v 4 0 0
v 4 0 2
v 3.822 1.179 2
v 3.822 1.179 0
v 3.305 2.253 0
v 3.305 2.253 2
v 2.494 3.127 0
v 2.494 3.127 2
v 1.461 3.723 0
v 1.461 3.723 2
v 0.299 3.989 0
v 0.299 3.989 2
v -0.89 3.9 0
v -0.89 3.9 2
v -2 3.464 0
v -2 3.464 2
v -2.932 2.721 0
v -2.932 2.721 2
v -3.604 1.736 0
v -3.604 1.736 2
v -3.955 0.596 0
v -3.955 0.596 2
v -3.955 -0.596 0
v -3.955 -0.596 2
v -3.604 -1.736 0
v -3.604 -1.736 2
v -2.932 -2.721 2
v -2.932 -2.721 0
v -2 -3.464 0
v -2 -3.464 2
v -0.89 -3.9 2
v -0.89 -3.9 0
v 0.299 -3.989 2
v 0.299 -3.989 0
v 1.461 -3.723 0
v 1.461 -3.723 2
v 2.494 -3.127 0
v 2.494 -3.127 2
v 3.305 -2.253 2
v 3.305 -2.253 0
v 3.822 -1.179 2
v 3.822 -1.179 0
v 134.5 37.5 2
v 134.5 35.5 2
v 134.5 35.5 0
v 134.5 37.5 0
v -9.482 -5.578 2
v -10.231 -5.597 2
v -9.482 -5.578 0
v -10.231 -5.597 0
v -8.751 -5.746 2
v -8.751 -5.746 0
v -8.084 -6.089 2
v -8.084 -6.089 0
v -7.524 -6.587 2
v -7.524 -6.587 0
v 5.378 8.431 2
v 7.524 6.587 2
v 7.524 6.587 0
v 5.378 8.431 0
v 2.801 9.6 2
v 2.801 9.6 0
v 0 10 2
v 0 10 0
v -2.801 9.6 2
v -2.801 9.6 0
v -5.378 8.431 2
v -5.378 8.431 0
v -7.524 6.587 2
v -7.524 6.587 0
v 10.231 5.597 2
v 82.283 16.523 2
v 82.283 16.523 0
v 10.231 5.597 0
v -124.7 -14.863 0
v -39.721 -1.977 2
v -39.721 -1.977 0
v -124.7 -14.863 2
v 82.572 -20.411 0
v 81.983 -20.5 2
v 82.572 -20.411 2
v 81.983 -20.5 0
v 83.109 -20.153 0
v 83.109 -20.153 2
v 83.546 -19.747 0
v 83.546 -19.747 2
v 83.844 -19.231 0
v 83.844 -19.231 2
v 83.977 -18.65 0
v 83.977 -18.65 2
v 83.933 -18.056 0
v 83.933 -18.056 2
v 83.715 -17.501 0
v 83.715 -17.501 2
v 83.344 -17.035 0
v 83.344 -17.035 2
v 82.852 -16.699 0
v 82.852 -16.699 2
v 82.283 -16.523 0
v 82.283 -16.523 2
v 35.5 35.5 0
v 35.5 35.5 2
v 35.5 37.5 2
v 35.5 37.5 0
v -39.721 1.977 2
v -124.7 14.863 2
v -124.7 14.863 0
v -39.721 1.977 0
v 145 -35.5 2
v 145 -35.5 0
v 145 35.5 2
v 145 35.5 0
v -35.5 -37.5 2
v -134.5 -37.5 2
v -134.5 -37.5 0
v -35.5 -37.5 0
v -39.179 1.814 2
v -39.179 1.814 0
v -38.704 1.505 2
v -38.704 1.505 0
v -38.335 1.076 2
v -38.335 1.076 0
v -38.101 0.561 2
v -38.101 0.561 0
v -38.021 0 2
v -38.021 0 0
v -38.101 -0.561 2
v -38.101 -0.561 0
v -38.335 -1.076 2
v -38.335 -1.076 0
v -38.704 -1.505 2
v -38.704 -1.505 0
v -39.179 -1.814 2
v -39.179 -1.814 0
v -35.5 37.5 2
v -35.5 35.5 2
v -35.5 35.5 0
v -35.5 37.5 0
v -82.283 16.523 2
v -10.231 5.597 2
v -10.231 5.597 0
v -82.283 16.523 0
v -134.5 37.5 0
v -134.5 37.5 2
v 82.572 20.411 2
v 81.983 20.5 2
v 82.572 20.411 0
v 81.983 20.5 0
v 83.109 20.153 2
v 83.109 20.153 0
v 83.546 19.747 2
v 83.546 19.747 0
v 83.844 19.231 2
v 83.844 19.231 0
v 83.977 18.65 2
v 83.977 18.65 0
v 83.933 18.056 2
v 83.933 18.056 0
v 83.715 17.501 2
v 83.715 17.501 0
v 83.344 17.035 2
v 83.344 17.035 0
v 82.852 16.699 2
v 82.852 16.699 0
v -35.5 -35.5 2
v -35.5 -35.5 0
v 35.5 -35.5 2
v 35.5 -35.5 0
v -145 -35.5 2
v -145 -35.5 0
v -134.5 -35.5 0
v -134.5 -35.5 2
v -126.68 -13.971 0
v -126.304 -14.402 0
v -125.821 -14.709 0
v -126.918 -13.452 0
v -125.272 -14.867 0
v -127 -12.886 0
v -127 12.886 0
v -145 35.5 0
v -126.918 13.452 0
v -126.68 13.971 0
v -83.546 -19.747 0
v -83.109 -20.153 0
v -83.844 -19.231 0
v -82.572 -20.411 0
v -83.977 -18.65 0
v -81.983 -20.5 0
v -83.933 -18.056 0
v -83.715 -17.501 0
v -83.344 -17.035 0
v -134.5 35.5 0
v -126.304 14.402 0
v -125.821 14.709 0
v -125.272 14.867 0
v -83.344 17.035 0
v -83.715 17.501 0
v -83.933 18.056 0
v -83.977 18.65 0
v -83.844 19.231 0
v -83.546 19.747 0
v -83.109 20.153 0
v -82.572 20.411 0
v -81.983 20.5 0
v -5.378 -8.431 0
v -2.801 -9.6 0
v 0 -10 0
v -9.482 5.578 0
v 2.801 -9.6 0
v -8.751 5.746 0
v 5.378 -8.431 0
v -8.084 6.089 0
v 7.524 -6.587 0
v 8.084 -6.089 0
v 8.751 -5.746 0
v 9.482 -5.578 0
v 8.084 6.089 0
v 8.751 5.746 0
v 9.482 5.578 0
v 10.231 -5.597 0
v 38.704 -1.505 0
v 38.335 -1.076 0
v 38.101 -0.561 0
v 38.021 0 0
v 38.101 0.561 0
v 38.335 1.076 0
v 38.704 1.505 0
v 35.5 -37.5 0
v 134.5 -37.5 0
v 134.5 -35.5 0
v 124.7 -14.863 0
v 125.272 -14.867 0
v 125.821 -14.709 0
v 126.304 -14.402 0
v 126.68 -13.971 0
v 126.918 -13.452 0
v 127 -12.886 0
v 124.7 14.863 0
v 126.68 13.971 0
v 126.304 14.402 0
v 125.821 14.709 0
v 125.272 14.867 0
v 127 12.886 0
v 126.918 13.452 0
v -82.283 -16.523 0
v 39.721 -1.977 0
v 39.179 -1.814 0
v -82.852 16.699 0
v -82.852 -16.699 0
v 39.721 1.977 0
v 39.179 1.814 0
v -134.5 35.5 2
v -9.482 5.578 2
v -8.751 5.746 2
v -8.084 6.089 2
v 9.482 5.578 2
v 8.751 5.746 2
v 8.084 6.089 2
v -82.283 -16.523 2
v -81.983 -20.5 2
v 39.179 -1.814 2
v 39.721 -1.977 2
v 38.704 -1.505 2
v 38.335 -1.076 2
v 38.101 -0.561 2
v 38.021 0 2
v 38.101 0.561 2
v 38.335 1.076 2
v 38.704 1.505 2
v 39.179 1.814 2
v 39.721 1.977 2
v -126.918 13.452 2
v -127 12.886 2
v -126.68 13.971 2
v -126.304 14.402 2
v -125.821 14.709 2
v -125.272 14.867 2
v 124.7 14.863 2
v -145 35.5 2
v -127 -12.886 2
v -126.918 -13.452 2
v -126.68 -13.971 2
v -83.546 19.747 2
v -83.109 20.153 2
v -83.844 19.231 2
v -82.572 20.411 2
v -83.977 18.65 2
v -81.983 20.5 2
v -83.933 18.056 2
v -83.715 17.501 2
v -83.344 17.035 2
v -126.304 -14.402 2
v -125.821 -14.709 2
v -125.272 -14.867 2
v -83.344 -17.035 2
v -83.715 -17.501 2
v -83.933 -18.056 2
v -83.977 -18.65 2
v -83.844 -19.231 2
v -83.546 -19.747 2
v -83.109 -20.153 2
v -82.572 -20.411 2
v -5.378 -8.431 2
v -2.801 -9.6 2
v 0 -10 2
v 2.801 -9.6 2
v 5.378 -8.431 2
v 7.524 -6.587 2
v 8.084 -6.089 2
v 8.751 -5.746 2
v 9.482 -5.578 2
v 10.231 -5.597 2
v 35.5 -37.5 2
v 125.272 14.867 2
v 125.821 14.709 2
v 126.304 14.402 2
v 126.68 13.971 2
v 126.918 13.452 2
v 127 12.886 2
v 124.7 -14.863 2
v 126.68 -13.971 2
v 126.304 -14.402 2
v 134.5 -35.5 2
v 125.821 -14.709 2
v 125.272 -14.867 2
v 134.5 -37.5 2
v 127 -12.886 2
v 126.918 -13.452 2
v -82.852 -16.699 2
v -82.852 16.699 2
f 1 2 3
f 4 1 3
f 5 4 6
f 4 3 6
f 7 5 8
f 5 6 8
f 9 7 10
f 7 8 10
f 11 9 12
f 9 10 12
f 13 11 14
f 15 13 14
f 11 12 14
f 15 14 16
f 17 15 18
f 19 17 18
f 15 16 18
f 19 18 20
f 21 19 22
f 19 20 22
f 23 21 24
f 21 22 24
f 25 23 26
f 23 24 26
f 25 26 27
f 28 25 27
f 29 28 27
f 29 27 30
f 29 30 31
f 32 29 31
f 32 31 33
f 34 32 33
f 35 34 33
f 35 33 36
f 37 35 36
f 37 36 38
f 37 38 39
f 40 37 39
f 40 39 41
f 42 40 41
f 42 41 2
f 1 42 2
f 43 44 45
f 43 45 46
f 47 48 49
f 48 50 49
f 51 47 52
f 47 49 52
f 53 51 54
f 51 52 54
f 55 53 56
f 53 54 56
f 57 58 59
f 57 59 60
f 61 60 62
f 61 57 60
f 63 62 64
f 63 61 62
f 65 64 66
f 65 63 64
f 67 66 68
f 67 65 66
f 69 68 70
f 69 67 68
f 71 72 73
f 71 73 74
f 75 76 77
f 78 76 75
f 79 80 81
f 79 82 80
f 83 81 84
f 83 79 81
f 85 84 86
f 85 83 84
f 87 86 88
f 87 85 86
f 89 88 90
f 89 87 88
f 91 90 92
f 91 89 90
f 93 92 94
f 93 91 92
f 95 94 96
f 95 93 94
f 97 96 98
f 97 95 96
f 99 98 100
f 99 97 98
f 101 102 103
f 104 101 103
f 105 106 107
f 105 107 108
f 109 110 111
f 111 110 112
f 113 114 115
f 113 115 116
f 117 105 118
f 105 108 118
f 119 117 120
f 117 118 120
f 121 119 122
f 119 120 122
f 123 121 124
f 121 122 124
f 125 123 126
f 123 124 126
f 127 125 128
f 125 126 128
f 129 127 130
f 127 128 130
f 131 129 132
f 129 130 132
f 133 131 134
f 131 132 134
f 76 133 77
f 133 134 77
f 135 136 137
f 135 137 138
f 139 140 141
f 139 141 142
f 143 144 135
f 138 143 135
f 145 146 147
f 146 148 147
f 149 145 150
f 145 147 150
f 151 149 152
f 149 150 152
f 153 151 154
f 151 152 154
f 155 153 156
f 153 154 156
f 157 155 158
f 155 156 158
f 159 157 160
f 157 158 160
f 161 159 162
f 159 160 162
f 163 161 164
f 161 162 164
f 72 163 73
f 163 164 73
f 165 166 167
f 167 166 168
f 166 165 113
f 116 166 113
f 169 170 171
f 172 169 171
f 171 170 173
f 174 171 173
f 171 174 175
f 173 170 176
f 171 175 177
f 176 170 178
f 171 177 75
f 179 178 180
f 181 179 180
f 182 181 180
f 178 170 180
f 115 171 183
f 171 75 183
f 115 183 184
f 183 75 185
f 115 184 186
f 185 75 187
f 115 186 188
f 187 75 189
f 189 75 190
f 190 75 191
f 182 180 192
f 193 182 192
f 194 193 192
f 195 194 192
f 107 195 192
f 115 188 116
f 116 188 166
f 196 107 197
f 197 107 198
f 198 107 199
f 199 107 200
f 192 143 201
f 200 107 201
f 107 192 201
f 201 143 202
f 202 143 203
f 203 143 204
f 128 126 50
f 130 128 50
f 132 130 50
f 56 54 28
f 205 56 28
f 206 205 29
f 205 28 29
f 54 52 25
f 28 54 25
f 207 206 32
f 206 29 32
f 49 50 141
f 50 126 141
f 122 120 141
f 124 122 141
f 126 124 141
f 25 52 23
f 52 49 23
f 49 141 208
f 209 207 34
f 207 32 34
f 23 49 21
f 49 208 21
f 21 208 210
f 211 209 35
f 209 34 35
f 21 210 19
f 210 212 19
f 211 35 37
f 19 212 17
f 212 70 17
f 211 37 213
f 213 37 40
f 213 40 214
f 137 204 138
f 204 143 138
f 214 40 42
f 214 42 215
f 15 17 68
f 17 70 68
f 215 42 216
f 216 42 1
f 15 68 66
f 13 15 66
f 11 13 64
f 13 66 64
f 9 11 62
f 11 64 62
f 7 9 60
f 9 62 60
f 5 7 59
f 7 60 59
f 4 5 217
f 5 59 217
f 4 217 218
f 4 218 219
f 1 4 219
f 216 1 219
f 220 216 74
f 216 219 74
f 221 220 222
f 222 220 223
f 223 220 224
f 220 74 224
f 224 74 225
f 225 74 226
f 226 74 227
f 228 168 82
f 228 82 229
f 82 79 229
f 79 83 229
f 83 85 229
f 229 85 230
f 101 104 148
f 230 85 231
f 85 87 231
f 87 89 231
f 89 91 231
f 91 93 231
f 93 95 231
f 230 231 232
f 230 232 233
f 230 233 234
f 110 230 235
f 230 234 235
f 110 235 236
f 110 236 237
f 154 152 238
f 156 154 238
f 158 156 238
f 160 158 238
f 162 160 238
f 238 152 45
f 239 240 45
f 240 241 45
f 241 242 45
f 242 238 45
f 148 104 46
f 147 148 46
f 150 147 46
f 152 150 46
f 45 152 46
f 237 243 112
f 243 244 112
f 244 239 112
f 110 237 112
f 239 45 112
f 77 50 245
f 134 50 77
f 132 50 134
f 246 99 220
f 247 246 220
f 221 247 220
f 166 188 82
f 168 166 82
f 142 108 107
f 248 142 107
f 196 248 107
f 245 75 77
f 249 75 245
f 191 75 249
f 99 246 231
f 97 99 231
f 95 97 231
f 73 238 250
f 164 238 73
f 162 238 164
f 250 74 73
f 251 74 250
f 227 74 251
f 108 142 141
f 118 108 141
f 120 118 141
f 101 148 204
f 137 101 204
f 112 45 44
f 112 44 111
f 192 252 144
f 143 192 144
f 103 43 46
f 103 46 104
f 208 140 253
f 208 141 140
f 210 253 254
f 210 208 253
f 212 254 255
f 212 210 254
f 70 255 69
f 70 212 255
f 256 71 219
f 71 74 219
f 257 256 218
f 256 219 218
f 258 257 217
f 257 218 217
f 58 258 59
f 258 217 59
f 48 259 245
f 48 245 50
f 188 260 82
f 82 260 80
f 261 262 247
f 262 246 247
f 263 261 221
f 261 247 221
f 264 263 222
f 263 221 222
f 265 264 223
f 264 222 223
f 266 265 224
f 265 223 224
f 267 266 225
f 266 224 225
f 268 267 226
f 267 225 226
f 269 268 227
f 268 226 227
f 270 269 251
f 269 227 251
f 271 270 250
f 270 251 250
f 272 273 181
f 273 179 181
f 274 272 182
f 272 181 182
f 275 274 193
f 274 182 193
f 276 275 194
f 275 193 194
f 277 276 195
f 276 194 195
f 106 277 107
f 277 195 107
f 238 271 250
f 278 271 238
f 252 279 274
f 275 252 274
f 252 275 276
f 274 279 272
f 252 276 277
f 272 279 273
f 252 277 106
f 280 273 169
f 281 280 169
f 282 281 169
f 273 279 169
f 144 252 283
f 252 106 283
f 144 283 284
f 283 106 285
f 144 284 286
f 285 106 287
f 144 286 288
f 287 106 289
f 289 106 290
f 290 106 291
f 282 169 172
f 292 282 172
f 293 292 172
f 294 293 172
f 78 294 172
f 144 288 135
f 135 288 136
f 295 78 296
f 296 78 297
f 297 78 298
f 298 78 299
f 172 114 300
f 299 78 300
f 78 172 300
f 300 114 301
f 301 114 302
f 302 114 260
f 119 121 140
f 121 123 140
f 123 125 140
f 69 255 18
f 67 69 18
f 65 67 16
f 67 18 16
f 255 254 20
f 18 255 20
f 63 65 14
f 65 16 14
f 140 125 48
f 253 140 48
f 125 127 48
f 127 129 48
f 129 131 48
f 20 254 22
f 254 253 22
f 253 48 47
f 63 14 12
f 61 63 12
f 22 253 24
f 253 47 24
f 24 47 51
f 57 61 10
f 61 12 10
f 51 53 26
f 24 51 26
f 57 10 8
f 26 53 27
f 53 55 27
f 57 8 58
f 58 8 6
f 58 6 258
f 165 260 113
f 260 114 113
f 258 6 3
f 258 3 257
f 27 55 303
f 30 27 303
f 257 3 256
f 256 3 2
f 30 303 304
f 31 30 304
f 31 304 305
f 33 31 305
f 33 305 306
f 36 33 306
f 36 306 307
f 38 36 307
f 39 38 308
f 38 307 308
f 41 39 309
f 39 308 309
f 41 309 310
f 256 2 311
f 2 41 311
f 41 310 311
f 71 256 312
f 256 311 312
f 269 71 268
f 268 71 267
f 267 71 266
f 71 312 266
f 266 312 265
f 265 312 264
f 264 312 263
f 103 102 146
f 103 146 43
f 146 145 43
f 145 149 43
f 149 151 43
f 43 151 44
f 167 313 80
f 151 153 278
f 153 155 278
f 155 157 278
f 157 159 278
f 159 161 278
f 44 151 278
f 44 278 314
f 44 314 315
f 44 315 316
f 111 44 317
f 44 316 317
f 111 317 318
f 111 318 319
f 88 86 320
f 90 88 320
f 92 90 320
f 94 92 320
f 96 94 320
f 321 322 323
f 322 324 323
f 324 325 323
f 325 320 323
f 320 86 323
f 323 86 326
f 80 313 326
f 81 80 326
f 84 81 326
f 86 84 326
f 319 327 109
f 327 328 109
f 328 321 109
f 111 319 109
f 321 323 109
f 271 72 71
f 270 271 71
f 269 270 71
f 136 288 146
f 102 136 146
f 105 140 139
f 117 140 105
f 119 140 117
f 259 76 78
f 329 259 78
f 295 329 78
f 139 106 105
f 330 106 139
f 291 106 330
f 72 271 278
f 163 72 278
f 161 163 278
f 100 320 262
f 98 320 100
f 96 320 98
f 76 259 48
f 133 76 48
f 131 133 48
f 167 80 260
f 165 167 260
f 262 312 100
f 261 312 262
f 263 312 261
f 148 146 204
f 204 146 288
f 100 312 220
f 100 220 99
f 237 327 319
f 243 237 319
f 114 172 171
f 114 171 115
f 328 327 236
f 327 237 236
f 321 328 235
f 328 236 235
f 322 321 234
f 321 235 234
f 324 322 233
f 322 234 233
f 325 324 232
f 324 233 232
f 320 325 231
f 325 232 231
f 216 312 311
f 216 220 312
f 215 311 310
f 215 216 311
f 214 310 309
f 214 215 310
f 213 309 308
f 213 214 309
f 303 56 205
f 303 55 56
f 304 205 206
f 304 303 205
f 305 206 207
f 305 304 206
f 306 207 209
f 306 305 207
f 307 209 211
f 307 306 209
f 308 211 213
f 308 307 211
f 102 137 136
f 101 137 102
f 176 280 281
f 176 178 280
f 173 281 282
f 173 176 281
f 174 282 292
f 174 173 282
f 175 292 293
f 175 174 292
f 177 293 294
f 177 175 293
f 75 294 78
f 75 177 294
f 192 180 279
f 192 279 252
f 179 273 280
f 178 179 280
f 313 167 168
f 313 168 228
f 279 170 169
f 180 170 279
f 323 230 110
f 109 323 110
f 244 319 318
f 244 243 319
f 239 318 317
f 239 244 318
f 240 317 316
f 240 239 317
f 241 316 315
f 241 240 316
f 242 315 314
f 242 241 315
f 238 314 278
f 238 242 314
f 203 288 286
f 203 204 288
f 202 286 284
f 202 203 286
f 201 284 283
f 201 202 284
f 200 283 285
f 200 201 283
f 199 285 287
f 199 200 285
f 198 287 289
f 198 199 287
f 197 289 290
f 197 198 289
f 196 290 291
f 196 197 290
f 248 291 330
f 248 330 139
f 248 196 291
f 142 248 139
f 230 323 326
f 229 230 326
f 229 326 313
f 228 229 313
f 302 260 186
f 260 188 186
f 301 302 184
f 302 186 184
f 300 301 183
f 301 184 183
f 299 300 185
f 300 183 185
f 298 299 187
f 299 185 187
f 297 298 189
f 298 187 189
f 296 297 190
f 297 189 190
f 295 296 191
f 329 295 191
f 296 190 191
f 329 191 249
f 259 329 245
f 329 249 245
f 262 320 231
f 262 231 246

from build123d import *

# Parameters (mm, degrees)
SKETCH_1_W               = 290
SKETCH_1_H               = 71
EXTRUDE_1_DEPTH          = 2
SKETCH_2_W               = 99
SKETCH_2_H               = 4
EXTRUDE_2_DEPTH          = 2
MIRROR_2_COPY_1_SKETCH_W = 99
MIRROR_2_COPY_1_SKETCH_H = 4
MIRROR_2_COPY_1_DEPTH    = 2
CUT_EXTRUDE_1_DEPTH      = 2
SKETCH_4_R               = 10
EXTRUDE_3_DEPTH          = 2
SKETCH_5_R               = 4
CUT_EXTRUDE_2_DEPTH      = 119
FILLET_1_R               = 2
FILLET_2_R               = 3


with BuildPart() as part:
    # 草图1 → 凸台-拉伸1 (new body)
    with BuildSketch(Plane.XY):
        Rectangle(SKETCH_1_W, SKETCH_1_H)
    extrude(amount=EXTRUDE_1_DEPTH)

    # 草图2 → 凸台-拉伸2 (add)
    with BuildSketch(Plane.XY.offset(2)):
        with Locations((-85, 35.5)):
            Rectangle(SKETCH_2_W, SKETCH_2_H)
    extrude_2 = extrude(amount=-EXTRUDE_2_DEPTH)

    # 镜向1: 凸台-拉伸2 across plane
    add(extrude_2.mirror(Plane(origin=(0, 0, 0), x_dir=(0, 0, 1), z_dir=(1, 0, 0))))

    # 镜向2: 凸台-拉伸2 across plane
    add(extrude_2.mirror(Plane.ZX))

    # 镜向2 copy 1 sketch → 镜向2 copy 1 (add)
    with BuildSketch(Plane(origin=(0, 0, 2), x_dir=(-1, 0, 0), z_dir=(0, 0, 1))):
        with Locations((-85, 35.5)):
            Rectangle(MIRROR_2_COPY_1_SKETCH_W, MIRROR_2_COPY_1_SKETCH_H)
    extrude(amount=-MIRROR_2_COPY_1_DEPTH)

    # 草图3 → 切除-拉伸1 (cut)
    with BuildSketch(Plane.XY.offset(2)):
        with BuildLine():
            Line((-122, -20.5), (122, -20.5))
            ThreePointArc((122, -20.5), (125.535533906, -19.035533906), (127, -15.5))
            Line((127, -15.5), (127, 15.5))
            ThreePointArc((127, 15.5), (125.535533906, 19.035533906), (122, 20.5))
            Line((122, 20.5), (-122, 20.5))
            ThreePointArc((-122, 20.5), (-125.535533906, 19.035533906), (-127, 15.5))
            Line((-127, 15.5), (-127, -15.5))
            ThreePointArc((-127, -15.5), (-125.535533906, -19.035533906), (-122, -20.5))
        make_face()
    extrude(amount=-CUT_EXTRUDE_1_DEPTH, mode=Mode.SUBTRACT)

    # 草图4 → 凸台-拉伸3 (add)
    # profile 1 of 4: a face of its own
    with BuildSketch(Plane.XY.offset(2)):
        Polygon((-145, 35.5), (-145, -35.5), (-134.5, -35.5), (-134.5, -37.5), (-35.5, -37.5), (-35.5, -35.5), (35.5, -35.5), (35.5, -37.5), (134.5, -37.5), (134.5, -35.5), (145, -35.5), (145, 35.5), (134.5, 35.5), (134.5, 37.5), (35.5, 37.5), (35.5, 35.5), (-35.5, 35.5), (-35.5, 37.5), (-134.5, 37.5), (-134.5, 35.5), align=None)
        Polygon((-127, 15.2118729), (-130.048778092, 15.67417323), (-124.935850494, 22.990325911), (-108.512649841, 20.5), (108.512649841, 20.5), (124.935850494, 22.990325911), (132.904602809, 16.107215147), (127, 15.2118729), (127, -15.2118729), (132.970266959, -16.117172106), (124.935850494, -22.990325911), (108.512649841, -20.5), (-108.512649841, -20.5), (-124.935850494, -22.990325911), (-130.138762831, -15.687818033), (-127, -15.2118729), align=None, mode=Mode.SUBTRACT)
    # profile 2 of 4: a face of its own
    with BuildSketch(Plane.XY.offset(2)):
        Circle(SKETCH_4_R)
    # profile 3 of 4: a face of its own
    with BuildSketch(Plane.XY.offset(2)):
        with BuildLine():
            Line((122, 20.5), (108.512649841, 20.5))
            Line((108.512649841, 20.5), (8.461883449, 5.32883932))
            ThreePointArc((8.461883449, 5.32883932), (9.607778996, 2.773189996), (10, 0))
            ThreePointArc((10, 0), (9.607778996, -2.773189996), (8.461883449, -5.32883932))
            Line((8.461883449, -5.32883932), (108.512649841, -20.5))
            Line((108.512649841, -20.5), (122, -20.5))
            ThreePointArc((122, -20.5), (125.535533906, -19.035533906), (127, -15.5))
            Line((127, -15.5), (127, -15.2118729))
            Line((127, -15.2118729), (26.68074467, 0))
            Line((26.68074467, 0), (127, 15.2118729))
            Line((127, 15.2118729), (127, 15.5))
            ThreePointArc((127, 15.5), (125.535533906, 19.035533906), (122, 20.5))
        make_face()
    # profile 4 of 4: a face of its own
    with BuildSketch(Plane.XY.offset(2)):
        with BuildLine():
            Line((-127, 15.5), (-127, 15.2118729))
            Line((-127, 15.2118729), (-26.68074467, 0))
            Line((-26.68074467, 0), (-127, -15.2118729))
            Line((-127, -15.2118729), (-127, -15.5))
            ThreePointArc((-127, -15.5), (-125.535533906, -19.035533906), (-122, -20.5))
            Line((-122, -20.5), (-108.512649841, -20.5))
            Line((-108.512649841, -20.5), (-8.461883449, -5.32883932))
            ThreePointArc((-8.461883449, -5.32883932), (-10, 0), (-8.461883449, 5.32883932))
            Line((-8.461883449, 5.32883932), (-108.512649841, 20.5))
            Line((-108.512649841, 20.5), (-122, 20.5))
            ThreePointArc((-122, 20.5), (-125.535533906, 19.035533906), (-127, 15.5))
        make_face()
    extrude(amount=-EXTRUDE_3_DEPTH)

    # 草图5 → 切除-拉伸2 (cut)
    with BuildSketch(Plane.XY.offset(2)):
        Circle(SKETCH_5_R)
    extrude(amount=-CUT_EXTRUDE_2_DEPTH, mode=Mode.SUBTRACT)

    # 圆角1
    fillet_1_edges = [part.edges().sort_by_distance(p)[0] for p in [
        (108.512649841, -20.5, 1),
        (127, -15.2118729, 1),
        (26.68074467, 0, 1),
        (127, 15.2118729, 1),
        (108.512649841, 20.5, 1),
        (-108.512649841, 20.5, 1),
        (-127, 15.2118729, 1),
        (-26.68074467, 0, 1),
        (-127, -15.2118729, 1),
        (-108.512649841, -20.5, 1),
    ]]
    fillet(fillet_1_edges, radius=FILLET_1_R)

    # 圆角2
    fillet_2_edges = [part.edges().sort_by_distance(p)[0] for p in [
        (8.461883449, -5.32883932, 1),
        (8.461883449, 5.32883932, 1),
        (-8.461883449, 5.32883932, 1),
        (-8.461883449, -5.32883932, 1),
    ]]
    fillet(fillet_2_edges, radius=FILLET_2_R)


solid = part.part
